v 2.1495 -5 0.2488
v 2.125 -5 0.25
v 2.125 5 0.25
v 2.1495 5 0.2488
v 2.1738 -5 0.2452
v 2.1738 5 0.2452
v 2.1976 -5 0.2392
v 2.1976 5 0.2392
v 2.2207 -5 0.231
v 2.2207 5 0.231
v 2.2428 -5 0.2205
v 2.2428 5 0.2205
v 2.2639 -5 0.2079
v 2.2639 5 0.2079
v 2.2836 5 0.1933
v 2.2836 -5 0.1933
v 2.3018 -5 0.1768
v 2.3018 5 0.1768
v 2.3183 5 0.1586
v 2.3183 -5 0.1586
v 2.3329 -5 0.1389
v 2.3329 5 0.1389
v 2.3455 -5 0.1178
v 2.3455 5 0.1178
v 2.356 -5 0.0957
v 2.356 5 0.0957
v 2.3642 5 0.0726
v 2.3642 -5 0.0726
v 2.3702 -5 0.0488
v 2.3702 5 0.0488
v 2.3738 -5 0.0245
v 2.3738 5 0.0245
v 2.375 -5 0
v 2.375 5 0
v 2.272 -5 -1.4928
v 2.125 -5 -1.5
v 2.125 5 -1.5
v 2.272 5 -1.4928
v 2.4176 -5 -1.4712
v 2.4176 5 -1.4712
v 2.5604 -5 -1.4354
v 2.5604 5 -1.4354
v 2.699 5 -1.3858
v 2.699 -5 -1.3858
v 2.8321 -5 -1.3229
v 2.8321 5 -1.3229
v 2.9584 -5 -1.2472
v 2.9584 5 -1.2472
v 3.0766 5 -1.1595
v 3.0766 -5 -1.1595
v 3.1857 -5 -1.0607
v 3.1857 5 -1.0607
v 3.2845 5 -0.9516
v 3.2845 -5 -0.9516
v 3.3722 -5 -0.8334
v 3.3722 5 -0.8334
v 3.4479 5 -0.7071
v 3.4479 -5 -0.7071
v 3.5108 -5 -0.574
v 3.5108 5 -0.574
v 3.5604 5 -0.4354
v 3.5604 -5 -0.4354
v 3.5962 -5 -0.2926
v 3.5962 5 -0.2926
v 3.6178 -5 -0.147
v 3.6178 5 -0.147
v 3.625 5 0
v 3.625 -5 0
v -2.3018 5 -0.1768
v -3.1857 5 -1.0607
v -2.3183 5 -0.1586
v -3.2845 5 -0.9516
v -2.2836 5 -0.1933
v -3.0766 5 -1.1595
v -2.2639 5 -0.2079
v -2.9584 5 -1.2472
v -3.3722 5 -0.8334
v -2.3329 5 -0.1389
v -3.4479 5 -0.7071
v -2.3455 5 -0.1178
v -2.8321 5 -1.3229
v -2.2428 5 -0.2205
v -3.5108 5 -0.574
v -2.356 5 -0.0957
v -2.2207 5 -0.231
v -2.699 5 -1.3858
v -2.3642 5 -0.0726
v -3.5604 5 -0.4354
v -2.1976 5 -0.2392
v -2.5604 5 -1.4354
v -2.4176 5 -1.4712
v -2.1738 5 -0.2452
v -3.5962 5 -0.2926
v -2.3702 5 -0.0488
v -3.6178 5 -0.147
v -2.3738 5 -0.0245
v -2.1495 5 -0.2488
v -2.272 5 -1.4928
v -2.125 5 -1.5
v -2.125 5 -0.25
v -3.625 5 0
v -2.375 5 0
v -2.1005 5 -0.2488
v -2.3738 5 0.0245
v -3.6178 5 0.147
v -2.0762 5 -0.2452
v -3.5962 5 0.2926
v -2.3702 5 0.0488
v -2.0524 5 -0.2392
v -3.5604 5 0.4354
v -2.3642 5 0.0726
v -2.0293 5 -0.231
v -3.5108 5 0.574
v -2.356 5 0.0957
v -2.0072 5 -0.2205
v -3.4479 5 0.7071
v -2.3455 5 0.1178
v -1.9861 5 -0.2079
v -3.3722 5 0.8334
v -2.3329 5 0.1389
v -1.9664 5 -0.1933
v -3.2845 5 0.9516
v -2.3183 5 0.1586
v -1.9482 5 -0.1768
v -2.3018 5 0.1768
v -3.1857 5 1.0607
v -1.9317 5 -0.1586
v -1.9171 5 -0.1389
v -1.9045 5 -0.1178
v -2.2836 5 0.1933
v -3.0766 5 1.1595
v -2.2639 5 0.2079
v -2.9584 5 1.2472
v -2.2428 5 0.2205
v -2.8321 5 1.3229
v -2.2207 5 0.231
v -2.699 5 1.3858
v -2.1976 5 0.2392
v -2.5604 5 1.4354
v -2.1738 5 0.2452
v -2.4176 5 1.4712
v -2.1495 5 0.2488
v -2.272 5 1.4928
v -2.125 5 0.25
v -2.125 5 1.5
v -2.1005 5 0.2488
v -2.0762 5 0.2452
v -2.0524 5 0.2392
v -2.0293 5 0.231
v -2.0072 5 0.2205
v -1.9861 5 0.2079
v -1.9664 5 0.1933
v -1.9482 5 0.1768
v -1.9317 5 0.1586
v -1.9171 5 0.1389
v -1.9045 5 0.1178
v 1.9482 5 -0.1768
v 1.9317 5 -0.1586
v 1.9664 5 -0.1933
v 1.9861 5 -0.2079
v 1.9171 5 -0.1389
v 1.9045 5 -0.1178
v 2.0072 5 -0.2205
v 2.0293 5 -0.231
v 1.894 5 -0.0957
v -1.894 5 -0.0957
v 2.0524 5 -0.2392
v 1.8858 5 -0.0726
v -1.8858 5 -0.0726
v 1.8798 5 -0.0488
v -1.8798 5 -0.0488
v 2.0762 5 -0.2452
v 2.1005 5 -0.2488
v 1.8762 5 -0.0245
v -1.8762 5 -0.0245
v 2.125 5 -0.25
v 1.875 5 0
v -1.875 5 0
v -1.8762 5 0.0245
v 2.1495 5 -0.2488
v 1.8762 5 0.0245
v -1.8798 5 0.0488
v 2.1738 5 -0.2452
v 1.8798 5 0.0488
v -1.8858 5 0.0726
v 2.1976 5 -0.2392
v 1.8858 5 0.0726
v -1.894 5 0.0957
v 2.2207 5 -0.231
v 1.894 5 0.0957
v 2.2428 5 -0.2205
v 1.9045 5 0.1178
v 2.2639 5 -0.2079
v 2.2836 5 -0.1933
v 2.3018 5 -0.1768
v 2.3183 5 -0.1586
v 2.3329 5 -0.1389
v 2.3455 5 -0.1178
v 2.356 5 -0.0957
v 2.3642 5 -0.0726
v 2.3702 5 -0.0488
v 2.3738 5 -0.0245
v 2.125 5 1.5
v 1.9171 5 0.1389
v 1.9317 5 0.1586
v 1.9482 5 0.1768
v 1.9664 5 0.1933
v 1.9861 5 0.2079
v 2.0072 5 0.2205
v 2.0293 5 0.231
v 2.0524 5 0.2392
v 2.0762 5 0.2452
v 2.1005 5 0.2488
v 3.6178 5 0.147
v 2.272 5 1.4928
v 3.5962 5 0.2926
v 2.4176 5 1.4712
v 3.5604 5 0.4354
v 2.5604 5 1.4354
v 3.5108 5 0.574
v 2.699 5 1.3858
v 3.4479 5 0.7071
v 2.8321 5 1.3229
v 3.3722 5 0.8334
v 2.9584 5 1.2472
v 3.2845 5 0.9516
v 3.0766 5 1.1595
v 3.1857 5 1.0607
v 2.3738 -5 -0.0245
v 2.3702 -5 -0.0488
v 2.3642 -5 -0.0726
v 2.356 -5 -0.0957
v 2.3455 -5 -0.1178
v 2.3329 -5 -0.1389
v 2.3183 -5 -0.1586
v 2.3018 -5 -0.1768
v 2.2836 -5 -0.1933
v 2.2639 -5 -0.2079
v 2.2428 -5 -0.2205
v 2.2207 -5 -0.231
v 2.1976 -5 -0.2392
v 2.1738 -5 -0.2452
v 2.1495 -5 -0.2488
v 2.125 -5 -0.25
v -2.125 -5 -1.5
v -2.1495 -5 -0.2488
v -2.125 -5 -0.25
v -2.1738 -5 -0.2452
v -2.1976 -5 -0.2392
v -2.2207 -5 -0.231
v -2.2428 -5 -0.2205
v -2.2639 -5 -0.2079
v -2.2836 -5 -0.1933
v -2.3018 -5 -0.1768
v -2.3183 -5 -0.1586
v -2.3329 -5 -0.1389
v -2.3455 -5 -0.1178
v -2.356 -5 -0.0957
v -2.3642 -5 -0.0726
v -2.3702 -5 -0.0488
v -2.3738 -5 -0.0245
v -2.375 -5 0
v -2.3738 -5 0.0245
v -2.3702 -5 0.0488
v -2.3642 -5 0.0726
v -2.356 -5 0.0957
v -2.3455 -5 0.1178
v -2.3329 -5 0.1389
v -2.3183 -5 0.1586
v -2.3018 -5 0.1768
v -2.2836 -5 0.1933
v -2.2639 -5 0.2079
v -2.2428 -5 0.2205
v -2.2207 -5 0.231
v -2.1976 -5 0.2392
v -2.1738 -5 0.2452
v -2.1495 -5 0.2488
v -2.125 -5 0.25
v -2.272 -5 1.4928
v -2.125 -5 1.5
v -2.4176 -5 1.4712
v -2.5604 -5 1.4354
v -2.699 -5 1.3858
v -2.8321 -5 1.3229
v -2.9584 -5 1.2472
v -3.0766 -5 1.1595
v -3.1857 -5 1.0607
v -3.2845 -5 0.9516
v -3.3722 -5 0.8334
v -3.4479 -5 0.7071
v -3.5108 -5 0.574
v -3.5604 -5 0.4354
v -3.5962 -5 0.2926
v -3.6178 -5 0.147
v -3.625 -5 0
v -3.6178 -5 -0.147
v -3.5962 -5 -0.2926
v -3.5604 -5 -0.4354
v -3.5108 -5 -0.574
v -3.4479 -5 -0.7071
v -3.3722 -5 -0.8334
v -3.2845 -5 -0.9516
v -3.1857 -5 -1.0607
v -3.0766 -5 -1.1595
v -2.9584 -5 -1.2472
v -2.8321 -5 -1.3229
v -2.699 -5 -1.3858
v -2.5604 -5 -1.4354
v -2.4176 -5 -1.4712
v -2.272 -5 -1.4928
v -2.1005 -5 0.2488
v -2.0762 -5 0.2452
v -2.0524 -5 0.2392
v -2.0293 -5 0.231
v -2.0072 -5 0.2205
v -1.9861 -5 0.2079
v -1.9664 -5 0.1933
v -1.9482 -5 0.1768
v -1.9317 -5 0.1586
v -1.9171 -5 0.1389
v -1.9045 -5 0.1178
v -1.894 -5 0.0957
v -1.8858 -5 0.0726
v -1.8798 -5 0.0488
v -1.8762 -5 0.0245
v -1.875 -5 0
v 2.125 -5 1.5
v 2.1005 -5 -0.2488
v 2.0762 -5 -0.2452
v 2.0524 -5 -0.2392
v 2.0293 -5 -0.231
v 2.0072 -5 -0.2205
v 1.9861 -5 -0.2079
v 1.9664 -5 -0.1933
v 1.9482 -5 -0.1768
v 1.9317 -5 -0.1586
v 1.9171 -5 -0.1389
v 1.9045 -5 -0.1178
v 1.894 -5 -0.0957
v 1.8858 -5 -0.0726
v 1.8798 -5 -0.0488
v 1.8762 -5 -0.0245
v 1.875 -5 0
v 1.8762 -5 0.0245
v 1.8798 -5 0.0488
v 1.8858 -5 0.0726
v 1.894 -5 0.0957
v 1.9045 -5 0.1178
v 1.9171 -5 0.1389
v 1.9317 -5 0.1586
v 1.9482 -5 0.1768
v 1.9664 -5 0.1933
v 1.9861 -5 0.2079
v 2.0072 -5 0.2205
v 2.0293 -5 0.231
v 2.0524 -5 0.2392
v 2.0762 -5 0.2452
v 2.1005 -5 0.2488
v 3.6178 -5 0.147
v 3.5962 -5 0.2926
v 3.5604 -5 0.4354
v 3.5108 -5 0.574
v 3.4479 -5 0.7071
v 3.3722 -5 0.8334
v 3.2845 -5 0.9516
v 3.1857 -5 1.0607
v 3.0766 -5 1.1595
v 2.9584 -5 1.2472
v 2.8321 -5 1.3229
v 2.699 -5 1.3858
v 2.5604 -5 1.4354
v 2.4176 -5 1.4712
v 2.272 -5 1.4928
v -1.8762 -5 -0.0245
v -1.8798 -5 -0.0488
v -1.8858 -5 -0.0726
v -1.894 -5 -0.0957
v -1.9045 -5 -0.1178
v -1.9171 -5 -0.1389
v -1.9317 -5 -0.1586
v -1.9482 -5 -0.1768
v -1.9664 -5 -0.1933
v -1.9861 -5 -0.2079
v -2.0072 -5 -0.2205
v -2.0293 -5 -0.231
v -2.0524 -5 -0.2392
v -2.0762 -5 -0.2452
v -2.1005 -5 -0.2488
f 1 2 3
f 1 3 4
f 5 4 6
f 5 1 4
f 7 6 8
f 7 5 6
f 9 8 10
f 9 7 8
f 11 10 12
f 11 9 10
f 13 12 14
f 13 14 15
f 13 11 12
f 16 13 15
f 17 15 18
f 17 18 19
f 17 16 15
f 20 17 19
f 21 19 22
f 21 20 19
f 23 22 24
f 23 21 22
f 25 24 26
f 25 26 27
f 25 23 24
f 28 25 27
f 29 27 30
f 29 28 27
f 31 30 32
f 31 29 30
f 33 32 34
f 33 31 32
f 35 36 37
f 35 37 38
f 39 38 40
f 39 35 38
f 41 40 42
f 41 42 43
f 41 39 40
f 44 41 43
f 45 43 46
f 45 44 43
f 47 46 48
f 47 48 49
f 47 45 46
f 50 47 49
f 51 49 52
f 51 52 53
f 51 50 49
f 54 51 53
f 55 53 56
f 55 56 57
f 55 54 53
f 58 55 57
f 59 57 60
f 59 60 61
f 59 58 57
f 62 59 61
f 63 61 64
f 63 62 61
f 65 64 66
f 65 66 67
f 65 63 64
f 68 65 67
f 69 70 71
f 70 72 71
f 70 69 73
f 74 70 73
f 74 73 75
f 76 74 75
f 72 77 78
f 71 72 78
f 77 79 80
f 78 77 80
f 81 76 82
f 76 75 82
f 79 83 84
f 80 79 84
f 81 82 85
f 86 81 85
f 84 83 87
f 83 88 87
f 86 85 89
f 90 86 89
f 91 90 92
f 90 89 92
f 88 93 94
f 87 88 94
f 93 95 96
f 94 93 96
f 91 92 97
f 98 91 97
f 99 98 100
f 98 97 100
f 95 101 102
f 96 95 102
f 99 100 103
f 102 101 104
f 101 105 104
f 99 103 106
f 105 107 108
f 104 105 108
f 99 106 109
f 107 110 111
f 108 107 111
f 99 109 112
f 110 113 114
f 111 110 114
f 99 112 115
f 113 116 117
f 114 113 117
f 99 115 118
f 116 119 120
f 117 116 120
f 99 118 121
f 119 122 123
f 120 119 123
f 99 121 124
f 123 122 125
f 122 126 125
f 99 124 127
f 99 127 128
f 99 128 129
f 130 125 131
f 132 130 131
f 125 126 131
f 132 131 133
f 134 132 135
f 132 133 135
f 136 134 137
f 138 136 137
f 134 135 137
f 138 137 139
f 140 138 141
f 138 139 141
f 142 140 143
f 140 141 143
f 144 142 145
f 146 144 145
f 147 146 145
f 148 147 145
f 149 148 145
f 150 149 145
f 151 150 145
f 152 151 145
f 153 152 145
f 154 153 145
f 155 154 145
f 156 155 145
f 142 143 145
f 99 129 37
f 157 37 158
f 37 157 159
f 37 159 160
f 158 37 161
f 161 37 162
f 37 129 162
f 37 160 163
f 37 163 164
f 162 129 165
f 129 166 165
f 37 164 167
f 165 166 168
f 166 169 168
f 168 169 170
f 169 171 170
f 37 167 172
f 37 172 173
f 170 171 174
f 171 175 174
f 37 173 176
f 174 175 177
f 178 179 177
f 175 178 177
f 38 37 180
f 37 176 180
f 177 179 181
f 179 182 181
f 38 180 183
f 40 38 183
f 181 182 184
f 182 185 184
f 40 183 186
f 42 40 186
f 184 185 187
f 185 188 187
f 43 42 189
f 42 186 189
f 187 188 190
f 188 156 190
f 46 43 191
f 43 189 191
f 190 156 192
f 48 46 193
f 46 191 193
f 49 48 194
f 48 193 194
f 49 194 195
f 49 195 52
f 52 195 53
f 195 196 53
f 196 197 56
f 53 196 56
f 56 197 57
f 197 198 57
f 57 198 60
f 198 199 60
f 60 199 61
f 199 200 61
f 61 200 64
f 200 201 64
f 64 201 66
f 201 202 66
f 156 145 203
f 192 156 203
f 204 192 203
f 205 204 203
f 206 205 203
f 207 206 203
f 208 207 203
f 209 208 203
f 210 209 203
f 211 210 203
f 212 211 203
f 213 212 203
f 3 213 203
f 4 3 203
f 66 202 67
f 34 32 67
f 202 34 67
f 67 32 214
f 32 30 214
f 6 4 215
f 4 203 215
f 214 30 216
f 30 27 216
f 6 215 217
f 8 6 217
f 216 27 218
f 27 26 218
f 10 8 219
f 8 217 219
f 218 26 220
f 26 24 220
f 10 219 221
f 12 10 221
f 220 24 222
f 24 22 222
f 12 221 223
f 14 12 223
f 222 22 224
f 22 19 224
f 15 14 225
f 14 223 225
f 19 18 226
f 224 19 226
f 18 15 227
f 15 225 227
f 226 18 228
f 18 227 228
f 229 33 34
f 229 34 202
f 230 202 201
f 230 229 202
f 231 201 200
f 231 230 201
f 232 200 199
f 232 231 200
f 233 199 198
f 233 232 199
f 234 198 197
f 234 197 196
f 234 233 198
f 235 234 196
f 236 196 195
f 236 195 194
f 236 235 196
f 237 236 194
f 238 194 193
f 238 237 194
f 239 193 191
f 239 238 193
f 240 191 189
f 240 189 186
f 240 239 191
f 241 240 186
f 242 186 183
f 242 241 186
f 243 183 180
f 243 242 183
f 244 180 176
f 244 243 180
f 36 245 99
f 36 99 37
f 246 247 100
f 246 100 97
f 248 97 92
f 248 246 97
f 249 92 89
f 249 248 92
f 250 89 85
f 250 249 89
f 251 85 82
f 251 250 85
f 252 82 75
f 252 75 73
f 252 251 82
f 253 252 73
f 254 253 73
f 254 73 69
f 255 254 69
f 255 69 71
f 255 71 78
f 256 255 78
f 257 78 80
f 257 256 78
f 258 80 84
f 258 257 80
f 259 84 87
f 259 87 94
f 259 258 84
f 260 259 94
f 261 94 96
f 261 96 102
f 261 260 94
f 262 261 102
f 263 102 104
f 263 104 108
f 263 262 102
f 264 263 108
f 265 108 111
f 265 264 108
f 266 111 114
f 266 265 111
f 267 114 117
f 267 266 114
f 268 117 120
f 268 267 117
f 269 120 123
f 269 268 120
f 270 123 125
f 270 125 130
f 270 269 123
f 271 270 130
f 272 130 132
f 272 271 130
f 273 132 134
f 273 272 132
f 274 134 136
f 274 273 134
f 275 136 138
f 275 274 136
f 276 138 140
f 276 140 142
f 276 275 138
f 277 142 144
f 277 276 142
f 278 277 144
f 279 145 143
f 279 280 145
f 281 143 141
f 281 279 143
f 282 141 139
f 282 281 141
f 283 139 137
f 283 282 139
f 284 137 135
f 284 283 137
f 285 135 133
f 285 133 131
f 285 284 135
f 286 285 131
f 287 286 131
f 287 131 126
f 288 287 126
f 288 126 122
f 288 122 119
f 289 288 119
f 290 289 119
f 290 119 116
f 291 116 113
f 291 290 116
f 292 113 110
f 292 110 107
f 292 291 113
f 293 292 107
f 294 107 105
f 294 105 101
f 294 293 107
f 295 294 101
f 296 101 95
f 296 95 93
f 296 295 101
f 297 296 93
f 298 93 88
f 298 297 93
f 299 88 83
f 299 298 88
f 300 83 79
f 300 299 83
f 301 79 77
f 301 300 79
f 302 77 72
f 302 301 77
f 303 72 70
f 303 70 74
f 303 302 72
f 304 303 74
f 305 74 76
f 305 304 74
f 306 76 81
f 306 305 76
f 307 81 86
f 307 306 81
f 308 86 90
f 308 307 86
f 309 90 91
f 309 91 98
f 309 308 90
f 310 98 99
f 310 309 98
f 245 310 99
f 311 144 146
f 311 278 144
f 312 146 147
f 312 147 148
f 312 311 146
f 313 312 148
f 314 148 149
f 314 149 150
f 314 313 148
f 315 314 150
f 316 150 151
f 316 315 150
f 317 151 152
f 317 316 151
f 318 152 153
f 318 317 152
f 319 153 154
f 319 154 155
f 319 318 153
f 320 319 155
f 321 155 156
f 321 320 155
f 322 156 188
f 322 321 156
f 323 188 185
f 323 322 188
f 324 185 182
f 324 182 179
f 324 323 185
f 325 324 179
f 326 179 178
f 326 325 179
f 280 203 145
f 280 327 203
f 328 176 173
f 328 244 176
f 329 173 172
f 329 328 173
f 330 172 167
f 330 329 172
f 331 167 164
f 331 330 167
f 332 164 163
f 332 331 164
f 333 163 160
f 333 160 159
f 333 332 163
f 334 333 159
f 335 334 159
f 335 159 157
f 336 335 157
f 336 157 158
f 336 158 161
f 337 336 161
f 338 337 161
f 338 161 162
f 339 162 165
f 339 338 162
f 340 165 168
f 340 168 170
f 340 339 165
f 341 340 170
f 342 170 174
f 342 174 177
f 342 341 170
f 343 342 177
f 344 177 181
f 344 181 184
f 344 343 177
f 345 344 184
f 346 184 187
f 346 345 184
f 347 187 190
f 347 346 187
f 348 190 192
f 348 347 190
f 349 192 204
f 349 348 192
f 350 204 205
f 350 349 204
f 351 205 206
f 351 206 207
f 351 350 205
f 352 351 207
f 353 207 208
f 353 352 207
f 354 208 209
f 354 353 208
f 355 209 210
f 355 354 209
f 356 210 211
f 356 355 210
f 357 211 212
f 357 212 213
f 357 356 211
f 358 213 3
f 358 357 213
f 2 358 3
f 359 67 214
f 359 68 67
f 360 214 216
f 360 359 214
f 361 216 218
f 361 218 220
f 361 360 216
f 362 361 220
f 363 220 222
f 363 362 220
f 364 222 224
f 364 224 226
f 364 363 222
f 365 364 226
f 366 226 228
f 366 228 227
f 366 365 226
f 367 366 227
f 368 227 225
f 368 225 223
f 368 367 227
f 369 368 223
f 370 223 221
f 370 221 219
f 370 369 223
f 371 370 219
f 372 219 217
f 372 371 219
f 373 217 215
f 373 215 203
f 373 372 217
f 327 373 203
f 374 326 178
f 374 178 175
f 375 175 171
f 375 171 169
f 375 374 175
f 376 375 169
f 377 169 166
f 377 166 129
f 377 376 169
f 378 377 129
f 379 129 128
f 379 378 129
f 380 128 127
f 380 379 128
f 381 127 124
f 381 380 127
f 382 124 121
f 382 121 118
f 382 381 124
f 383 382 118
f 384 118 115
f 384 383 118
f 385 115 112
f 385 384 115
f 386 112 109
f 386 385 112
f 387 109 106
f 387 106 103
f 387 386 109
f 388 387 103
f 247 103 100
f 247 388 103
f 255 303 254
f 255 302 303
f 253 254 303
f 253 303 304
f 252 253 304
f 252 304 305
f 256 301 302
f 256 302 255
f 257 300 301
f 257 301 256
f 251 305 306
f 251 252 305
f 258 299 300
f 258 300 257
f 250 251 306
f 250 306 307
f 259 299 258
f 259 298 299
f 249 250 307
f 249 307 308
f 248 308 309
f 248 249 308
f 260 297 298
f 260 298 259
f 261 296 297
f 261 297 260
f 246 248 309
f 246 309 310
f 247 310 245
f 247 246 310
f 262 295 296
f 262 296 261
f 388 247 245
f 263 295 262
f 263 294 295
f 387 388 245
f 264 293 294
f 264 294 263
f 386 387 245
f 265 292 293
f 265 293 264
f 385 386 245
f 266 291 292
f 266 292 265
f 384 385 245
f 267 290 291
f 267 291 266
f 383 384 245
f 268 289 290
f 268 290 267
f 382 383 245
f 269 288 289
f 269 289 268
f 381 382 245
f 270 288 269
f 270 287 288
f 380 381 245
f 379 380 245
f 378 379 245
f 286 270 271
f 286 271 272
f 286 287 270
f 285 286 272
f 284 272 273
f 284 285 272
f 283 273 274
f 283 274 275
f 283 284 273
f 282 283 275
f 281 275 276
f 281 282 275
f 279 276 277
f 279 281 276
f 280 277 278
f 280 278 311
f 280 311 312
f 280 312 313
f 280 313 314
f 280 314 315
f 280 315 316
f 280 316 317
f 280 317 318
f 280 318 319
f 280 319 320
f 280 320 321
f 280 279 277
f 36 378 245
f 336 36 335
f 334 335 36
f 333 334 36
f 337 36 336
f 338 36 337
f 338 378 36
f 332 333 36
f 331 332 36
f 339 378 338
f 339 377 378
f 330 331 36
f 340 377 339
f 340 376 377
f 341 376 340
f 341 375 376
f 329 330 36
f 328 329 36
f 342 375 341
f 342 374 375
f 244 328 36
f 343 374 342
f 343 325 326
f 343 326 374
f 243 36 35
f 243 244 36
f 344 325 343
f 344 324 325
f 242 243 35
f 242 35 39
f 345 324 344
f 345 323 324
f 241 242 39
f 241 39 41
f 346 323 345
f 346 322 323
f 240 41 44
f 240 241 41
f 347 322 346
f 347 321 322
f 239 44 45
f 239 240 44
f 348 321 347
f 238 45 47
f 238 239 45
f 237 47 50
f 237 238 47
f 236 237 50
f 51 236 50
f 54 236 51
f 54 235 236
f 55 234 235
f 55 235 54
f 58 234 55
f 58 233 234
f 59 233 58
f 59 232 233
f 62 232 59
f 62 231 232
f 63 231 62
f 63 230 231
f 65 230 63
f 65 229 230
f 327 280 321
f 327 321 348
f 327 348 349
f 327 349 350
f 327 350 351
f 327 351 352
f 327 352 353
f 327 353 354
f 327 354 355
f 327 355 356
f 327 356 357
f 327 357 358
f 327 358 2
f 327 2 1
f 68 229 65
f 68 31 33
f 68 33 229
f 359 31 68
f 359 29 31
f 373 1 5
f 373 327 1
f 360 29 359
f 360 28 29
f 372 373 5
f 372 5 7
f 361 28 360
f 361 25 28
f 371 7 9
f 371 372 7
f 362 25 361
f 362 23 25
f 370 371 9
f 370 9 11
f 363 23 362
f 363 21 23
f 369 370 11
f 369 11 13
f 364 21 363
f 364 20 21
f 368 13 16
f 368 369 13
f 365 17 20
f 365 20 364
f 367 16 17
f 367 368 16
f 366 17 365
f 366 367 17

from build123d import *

# Parameters (mm, degrees)
F1_DEPTH = 5


with BuildPart() as f1:
    # F0 (on Front) → F1 (new body, symmetric)
    with BuildSketch(Plane.XZ):
        with BuildLine():
            ThreePointArc((-0.625, 0), (-1.06434, 1.06066), (-2.125, 1.5))
            Line((-2.125, 1.5), (-2.125, 0.25))
            ThreePointArc((-2.125, 0.25), (-1.948223, 0.176777), (-1.875, 0))
            ThreePointArc((-1.875, 0), (-1.948223, -0.176777), (-2.125, -0.25))
            Line((-2.125, -0.25), (-2.125, -1.5))
            ThreePointArc((-2.125, -1.5), (-1.06434, -1.06066), (-0.625, 0))
        make_face()
        with BuildLine():
            Line((-2.125, 0.25), (-2.125, 1.5))
            ThreePointArc((-2.125, 1.5), (-3.625, 0), (-2.125, -1.5))
            Line((-2.125, -1.5), (-2.125, -0.25))
            ThreePointArc((-2.125, -0.25), (-2.375, 0), (-2.125, 0.25))
        make_face()
        with BuildLine():
            Line((2.125, 1.5), (-2.125, 1.5))
            ThreePointArc((-2.125, 1.5), (-1.06434, 1.06066), (-0.625, 0))
            ThreePointArc((-0.625, 0), (-1.06434, -1.06066), (-2.125, -1.5))
            Line((-2.125, -1.5), (2.125, -1.5))
            ThreePointArc((2.125, -1.5), (0.625, 0), (2.125, 1.5))
        make_face()
        with BuildLine():
            ThreePointArc((3.625, 0), (3.18566, 1.06066), (2.125, 1.5))
            Line((2.125, 1.5), (2.125, 0.25))
            ThreePointArc((2.125, 0.25), (2.301777, 0.176777), (2.375, 0))
            ThreePointArc((2.375, 0), (2.301777, -0.176777), (2.125, -0.25))
            Line((2.125, -0.25), (2.125, -1.5))
            ThreePointArc((2.125, -1.5), (3.18566, -1.06066), (3.625, 0))
        make_face()
        with BuildLine():
            Line((2.125, 0.25), (2.125, 1.5))
            ThreePointArc((2.125, 1.5), (0.625, 0), (2.125, -1.5))
            Line((2.125, -1.5), (2.125, -0.25))
            ThreePointArc((2.125, -0.25), (1.875, 0), (2.125, 0.25))
        make_face()
    extrude(amount=F1_DEPTH, both=True)


solid = f1.part
